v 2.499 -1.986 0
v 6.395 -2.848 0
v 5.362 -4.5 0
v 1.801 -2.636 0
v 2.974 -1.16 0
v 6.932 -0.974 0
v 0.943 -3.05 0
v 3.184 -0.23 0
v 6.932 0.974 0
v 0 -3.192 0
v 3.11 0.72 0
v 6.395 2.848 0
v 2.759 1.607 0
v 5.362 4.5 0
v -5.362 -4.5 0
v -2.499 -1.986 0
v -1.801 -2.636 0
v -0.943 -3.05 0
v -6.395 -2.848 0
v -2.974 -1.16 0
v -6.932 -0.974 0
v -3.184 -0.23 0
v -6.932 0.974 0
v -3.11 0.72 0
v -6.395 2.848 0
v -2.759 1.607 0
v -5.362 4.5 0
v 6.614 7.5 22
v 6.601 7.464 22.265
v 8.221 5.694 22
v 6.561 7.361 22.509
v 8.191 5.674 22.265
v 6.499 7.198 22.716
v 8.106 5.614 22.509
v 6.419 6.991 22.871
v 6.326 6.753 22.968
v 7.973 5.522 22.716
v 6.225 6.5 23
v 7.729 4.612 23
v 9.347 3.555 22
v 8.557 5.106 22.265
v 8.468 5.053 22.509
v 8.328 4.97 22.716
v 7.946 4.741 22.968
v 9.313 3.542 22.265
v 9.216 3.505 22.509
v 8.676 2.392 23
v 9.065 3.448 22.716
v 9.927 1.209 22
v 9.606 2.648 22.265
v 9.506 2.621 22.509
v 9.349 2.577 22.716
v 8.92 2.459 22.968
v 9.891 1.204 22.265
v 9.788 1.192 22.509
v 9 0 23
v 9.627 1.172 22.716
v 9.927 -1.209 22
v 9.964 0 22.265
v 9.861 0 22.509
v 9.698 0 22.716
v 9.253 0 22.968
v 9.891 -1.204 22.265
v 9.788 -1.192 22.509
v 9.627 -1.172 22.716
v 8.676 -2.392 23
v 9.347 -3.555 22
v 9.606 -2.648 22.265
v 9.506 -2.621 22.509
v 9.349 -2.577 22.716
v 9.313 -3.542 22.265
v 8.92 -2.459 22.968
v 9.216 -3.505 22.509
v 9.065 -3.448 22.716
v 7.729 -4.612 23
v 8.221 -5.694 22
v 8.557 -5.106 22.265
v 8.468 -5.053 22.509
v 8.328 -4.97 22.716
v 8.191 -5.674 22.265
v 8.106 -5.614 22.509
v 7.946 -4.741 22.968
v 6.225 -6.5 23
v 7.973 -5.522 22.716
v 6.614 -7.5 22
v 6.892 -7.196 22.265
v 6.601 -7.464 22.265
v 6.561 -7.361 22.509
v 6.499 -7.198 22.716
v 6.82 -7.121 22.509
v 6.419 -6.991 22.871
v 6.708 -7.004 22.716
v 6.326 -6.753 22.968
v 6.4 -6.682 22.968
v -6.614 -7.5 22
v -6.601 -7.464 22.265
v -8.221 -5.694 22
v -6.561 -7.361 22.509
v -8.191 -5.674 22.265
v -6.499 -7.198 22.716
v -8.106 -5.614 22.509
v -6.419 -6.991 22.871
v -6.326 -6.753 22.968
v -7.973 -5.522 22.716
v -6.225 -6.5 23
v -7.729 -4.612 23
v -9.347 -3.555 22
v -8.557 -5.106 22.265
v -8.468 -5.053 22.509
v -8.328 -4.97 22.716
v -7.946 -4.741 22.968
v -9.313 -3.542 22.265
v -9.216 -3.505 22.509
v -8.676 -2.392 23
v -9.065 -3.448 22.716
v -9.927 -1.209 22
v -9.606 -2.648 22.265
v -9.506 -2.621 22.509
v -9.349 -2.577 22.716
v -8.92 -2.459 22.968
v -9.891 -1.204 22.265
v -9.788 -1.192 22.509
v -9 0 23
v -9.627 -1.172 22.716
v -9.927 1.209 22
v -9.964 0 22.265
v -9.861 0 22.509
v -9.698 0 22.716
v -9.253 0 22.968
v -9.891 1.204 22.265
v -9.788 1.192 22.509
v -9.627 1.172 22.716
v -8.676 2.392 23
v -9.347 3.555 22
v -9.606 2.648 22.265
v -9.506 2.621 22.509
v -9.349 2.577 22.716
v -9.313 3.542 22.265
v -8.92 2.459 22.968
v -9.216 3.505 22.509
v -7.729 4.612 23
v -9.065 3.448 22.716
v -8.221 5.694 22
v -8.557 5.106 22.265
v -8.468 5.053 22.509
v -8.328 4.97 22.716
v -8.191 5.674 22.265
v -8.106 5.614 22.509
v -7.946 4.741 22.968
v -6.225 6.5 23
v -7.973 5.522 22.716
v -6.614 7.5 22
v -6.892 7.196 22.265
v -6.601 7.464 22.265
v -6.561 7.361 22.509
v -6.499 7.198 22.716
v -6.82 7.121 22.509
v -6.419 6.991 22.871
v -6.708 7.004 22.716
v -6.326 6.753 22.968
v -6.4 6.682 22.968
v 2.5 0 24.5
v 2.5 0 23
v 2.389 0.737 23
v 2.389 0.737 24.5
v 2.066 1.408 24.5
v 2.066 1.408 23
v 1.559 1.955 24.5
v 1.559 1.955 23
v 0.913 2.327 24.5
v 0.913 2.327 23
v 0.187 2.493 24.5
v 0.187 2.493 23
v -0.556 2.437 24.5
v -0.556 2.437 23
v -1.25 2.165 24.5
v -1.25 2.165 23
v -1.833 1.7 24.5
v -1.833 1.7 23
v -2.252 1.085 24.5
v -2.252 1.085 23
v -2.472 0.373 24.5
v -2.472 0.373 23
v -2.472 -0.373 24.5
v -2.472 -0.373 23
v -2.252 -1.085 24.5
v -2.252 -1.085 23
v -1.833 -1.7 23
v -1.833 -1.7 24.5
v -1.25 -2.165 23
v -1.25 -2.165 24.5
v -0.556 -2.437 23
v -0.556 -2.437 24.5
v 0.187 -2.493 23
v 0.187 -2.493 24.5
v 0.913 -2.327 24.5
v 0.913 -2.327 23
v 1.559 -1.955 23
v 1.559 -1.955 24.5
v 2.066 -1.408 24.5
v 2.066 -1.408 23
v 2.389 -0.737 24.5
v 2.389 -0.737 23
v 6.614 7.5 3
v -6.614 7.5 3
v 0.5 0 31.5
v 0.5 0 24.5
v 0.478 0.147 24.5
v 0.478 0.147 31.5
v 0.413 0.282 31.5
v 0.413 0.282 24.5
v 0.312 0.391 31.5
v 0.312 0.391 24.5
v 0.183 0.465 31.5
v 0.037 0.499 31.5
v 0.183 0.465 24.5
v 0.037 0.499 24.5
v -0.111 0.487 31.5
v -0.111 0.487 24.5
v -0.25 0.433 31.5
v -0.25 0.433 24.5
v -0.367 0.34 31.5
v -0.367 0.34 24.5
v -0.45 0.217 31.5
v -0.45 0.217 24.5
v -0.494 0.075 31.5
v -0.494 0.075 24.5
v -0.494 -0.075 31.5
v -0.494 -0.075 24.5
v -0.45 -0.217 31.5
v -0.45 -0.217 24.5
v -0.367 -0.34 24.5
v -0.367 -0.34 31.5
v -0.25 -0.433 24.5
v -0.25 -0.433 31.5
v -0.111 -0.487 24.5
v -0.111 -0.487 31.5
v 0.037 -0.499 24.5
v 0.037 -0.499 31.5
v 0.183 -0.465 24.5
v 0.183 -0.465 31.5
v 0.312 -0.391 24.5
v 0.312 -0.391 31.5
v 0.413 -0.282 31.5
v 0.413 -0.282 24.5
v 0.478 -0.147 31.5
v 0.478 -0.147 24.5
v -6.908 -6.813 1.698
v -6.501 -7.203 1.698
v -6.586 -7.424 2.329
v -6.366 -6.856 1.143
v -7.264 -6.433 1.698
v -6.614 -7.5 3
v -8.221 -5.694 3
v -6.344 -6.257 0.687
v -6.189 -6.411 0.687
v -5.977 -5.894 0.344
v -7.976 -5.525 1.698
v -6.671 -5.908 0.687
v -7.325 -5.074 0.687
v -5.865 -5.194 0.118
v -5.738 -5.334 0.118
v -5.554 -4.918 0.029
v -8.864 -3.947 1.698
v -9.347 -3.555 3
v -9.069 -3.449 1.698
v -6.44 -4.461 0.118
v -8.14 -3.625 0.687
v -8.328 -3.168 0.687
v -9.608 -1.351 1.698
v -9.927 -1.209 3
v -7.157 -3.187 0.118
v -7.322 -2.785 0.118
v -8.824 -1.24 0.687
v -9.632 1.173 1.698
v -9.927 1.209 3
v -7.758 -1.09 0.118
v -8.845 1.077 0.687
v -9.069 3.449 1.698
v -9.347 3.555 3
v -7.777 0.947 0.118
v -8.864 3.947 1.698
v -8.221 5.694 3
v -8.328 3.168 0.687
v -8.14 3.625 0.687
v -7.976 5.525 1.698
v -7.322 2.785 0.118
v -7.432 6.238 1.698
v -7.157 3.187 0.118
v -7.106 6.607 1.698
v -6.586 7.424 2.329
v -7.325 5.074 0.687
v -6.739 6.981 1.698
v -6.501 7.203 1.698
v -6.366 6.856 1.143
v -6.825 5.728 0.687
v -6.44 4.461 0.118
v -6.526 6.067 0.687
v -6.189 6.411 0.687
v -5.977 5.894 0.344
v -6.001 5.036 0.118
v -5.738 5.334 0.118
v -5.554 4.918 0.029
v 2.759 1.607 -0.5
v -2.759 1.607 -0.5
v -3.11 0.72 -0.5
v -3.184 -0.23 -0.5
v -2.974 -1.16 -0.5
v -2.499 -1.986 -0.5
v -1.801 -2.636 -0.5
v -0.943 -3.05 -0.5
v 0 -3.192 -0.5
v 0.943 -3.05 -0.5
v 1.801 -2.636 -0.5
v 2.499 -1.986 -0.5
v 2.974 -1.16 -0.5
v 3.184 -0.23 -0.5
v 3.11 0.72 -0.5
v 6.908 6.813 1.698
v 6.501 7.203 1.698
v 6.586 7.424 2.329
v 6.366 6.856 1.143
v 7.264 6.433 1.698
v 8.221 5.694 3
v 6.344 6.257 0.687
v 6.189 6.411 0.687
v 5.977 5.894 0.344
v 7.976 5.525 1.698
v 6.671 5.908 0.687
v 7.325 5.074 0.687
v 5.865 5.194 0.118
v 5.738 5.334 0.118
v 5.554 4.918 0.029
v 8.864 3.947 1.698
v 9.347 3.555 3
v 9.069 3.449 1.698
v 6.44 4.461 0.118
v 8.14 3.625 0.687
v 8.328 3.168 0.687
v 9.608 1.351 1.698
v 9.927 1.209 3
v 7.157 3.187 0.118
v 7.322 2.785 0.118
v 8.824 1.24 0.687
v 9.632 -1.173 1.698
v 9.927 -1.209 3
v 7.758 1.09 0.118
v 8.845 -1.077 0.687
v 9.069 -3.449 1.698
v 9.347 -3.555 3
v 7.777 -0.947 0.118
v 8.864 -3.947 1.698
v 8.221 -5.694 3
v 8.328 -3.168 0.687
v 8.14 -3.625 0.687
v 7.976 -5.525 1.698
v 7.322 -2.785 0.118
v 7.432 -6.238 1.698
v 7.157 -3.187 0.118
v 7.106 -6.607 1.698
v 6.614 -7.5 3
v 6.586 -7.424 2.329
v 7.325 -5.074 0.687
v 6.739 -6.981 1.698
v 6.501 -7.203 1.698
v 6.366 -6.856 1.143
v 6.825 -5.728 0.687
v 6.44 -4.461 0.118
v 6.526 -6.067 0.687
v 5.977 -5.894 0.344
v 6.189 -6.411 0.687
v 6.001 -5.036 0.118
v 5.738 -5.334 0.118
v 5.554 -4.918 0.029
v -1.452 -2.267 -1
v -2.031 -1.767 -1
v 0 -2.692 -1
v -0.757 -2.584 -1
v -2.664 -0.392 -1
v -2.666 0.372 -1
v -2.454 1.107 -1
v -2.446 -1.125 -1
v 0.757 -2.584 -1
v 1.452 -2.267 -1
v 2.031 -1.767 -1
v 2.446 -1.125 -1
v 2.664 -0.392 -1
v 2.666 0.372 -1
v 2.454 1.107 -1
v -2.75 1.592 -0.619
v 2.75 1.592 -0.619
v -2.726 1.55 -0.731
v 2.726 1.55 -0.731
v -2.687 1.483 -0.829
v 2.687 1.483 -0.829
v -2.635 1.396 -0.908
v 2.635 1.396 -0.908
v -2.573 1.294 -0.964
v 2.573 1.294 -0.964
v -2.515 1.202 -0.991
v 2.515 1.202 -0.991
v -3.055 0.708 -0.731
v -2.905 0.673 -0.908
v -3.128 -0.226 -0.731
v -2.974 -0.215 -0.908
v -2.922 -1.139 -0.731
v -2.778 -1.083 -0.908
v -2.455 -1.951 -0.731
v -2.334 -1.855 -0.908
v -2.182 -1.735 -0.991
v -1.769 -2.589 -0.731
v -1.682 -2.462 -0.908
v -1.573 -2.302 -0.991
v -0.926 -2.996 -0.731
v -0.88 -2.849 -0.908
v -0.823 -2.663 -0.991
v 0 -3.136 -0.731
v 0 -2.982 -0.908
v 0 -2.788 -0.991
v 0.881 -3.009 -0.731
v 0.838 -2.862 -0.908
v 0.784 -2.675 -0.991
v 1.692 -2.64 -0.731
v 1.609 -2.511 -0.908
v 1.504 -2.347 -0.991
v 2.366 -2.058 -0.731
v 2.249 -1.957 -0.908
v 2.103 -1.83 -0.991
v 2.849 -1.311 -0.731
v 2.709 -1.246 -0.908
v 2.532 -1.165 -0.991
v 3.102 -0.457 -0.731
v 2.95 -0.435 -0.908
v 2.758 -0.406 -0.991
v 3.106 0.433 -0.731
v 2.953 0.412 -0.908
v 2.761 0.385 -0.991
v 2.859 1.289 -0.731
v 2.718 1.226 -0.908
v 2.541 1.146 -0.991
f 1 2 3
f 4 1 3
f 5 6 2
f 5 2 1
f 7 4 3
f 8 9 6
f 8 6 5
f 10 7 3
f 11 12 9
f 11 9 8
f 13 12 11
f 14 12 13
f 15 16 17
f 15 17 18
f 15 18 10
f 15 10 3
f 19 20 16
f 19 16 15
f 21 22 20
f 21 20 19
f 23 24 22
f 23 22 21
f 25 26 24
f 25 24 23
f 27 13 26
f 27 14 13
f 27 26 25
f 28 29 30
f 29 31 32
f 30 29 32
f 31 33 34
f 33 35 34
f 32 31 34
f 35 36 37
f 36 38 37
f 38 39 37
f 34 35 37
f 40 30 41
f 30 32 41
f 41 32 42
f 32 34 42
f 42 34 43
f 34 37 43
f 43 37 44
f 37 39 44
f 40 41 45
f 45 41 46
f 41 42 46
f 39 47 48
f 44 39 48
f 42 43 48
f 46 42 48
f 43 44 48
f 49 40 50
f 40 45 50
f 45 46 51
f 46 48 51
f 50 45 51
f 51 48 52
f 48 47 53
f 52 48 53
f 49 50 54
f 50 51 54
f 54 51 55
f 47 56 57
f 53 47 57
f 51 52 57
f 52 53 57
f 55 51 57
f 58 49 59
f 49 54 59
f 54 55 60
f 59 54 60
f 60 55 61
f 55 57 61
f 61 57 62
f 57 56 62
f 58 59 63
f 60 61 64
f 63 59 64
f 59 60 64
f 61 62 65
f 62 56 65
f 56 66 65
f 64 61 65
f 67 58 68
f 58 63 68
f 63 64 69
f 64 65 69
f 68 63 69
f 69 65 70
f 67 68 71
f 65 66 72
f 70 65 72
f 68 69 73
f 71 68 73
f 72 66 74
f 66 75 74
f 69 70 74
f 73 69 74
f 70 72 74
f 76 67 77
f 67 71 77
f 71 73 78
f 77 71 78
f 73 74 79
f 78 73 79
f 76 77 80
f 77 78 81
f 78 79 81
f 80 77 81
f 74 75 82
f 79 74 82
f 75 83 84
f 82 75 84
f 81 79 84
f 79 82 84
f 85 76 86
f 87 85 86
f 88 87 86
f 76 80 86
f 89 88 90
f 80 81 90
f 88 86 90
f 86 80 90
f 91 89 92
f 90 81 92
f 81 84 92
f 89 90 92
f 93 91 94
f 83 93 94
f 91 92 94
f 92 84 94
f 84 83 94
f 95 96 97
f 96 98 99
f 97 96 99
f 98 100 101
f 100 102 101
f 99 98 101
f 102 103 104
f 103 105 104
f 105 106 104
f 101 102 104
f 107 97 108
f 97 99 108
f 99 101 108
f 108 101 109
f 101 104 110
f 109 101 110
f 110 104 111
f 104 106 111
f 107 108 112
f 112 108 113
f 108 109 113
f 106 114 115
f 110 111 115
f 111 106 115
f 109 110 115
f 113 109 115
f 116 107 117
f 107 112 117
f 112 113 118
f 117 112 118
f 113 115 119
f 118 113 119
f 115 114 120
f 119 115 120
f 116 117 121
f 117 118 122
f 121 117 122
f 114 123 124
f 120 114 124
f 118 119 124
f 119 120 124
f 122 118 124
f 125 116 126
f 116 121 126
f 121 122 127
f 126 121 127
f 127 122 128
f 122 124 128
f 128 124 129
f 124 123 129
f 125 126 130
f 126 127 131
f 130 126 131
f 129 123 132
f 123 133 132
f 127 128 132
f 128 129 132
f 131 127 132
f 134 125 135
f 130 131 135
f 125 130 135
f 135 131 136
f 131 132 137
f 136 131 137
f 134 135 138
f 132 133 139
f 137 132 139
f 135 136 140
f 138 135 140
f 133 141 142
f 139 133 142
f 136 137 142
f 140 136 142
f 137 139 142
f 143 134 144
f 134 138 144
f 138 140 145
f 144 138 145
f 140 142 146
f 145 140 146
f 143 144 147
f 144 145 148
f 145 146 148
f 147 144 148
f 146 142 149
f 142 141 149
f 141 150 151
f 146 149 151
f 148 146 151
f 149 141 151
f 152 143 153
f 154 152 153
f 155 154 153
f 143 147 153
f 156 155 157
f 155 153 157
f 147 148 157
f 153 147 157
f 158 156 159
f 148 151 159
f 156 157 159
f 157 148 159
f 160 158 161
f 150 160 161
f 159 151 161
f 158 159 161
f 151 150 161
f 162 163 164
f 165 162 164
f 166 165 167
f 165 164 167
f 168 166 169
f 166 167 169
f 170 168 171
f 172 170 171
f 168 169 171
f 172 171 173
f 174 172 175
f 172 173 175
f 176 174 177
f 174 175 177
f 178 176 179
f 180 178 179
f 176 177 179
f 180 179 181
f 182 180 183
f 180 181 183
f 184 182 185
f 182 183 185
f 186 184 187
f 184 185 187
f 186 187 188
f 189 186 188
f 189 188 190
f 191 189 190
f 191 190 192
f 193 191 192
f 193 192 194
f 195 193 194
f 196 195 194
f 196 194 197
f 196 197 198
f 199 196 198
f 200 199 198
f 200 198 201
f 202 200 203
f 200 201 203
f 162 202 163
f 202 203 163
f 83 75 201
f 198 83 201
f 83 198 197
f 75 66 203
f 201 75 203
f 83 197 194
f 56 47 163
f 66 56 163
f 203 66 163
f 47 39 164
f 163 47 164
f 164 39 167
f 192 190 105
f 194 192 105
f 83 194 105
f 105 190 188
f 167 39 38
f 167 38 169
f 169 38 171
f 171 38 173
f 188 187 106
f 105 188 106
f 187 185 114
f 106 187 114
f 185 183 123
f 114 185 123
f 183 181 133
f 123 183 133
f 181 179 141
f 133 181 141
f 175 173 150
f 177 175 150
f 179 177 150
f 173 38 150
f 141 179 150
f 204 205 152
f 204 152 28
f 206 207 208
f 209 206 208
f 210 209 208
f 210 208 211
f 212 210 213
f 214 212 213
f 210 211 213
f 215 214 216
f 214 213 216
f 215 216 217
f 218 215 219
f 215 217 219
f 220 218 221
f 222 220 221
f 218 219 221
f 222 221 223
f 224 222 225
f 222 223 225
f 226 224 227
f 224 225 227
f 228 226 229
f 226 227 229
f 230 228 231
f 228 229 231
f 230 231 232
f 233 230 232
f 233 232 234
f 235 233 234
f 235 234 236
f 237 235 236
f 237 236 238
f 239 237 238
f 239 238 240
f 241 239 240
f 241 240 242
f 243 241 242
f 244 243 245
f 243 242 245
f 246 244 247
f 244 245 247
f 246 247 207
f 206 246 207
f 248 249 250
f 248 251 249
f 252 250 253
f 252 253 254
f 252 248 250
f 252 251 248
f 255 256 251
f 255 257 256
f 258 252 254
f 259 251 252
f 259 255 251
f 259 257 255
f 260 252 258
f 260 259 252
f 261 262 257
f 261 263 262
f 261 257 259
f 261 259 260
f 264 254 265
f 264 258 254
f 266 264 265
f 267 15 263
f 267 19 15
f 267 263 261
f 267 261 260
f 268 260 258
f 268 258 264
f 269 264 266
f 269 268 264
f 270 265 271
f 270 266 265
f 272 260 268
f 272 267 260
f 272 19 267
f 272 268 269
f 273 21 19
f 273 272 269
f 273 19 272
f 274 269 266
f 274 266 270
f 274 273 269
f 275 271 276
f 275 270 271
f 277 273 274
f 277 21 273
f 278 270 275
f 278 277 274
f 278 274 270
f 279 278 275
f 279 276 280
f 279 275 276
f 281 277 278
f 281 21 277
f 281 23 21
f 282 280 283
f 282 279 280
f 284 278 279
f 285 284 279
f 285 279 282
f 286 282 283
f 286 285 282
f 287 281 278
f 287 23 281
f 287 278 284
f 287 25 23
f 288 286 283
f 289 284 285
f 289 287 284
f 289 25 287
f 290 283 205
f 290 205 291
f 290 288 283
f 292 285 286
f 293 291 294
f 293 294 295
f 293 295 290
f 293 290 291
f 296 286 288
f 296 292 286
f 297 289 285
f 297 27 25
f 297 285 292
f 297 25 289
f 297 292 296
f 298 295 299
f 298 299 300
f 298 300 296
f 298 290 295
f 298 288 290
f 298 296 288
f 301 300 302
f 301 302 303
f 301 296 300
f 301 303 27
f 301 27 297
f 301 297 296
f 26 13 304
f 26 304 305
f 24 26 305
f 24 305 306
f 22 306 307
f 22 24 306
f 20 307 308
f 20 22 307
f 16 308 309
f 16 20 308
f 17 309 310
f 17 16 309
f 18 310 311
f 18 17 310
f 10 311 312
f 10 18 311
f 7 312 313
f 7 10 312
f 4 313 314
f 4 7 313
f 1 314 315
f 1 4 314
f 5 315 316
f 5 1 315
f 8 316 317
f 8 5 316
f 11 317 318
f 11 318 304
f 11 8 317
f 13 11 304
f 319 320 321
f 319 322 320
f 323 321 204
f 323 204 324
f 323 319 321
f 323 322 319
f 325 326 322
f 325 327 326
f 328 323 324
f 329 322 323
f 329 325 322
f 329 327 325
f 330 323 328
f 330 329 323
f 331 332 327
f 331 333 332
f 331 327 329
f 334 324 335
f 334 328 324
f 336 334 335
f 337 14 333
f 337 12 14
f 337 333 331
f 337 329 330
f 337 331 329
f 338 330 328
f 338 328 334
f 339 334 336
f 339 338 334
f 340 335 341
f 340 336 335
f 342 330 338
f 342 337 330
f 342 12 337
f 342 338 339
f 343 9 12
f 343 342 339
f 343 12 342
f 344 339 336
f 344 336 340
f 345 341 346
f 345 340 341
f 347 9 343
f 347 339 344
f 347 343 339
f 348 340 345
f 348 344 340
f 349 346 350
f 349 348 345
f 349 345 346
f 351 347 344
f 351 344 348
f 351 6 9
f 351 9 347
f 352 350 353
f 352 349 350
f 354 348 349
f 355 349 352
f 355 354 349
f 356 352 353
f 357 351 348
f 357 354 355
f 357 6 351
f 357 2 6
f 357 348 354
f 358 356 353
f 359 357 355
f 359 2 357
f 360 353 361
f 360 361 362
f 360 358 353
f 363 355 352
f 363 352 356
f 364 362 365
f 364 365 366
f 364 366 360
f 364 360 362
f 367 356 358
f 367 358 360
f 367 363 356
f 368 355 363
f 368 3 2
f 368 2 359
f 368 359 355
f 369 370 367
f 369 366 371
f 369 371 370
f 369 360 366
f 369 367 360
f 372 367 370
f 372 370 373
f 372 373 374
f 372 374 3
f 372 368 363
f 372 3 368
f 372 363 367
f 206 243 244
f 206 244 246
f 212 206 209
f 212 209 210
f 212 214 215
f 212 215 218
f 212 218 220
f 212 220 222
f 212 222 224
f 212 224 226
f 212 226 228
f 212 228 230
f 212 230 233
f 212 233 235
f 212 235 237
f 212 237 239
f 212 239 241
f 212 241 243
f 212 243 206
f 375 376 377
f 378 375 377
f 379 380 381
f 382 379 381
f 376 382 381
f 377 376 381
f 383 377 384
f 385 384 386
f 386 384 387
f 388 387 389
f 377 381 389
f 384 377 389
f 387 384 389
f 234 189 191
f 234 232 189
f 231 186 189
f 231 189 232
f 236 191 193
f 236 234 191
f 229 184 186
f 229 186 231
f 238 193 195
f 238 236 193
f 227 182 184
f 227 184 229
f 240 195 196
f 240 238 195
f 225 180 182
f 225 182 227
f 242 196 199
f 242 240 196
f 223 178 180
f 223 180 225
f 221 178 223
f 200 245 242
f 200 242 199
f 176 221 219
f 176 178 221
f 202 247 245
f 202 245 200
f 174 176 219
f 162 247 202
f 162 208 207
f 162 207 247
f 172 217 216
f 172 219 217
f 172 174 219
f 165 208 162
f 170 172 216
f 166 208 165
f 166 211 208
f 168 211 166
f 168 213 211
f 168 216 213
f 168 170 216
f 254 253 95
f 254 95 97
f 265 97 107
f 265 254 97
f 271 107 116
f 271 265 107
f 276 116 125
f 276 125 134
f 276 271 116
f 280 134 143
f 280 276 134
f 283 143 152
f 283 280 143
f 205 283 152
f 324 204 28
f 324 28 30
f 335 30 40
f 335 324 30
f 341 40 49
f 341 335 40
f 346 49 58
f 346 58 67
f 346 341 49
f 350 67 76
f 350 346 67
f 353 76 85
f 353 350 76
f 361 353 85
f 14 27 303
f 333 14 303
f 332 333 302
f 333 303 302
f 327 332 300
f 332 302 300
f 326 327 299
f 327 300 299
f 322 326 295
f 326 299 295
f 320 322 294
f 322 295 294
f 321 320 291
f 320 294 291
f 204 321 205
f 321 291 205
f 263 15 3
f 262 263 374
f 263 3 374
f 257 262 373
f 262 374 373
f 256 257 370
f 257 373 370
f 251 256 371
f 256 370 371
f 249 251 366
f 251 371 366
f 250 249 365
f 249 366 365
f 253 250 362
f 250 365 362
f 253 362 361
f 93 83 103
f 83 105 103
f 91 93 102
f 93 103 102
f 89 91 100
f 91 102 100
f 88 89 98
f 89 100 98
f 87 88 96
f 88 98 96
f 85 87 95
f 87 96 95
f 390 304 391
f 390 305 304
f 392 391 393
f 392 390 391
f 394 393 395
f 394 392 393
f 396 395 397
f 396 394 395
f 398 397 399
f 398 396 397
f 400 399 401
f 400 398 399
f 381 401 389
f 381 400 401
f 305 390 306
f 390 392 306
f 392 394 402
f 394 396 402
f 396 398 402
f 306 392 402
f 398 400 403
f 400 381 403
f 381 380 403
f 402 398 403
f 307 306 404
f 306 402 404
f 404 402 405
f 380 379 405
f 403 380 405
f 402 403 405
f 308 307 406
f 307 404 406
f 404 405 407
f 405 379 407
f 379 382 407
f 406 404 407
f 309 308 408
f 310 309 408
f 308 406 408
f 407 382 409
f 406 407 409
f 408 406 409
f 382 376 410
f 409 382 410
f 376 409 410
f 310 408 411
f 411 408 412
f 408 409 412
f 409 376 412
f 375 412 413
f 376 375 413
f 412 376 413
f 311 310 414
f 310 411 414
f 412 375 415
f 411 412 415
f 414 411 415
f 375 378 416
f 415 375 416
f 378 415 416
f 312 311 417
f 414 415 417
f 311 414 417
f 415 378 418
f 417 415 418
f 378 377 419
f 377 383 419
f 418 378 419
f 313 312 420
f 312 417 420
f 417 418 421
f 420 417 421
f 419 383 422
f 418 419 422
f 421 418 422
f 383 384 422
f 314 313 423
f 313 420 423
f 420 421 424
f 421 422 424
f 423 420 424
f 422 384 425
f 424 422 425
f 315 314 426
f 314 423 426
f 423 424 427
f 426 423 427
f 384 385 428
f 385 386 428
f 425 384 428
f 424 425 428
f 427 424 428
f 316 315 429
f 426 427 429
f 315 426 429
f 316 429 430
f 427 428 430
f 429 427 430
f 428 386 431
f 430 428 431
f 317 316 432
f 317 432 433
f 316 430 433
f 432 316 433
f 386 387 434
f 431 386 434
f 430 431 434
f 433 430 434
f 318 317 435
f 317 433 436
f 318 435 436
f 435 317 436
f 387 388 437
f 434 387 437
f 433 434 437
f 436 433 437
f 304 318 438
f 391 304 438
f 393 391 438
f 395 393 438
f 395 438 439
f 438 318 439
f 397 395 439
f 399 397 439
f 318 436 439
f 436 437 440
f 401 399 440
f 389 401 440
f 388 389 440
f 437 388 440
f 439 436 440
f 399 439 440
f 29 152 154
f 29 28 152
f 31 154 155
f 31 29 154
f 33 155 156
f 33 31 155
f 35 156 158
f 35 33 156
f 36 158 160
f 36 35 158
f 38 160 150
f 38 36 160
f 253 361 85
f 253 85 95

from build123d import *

# Parameters (mm, degrees)
BOSS_EXTRUDE1_DEPTH = 23
SKETCH2_R           = 2.5
BOSS_EXTRUDE2_DEPTH = 1.5
SKETCH3_R           = 0.5
BOSS_EXTRUDE3_DEPTH = 7
FILLET1_R           = 1
FILLET2_R           = 3
BOSS_EXTRUDE4_DEPTH = 1
FILLET3_R           = 0.5


with BuildPart() as part:
    # Sketch1 → Boss-Extrude1 (new body)
    with BuildSketch(Plane.XY):
        with BuildLine():
            Line((-6.614378278, 7.5), (6.614378278, 7.5))
            ThreePointArc((6.614378278, 7.5), (10, 0), (6.614378278, -7.5))
            Line((6.614378278, -7.5), (-6.614378278, -7.5))
            ThreePointArc((-6.614378278, -7.5), (-10, 0), (-6.614378278, 7.5))
        make_face()
    extrude(amount=BOSS_EXTRUDE1_DEPTH)

    # Sketch2 → Boss-Extrude2 (add)
    with BuildSketch(Plane.XY.offset(23)):
        Circle(SKETCH2_R)
    extrude(amount=BOSS_EXTRUDE2_DEPTH)

    # Sketch3 → Boss-Extrude3 (add)
    with BuildSketch(Plane.XY.offset(24.5)):
        Circle(SKETCH3_R)
    extrude(amount=BOSS_EXTRUDE3_DEPTH)

    # Fillet1
    fillet1_edges = [part.edges().sort_by_distance(p)[0] for p in [
        (10, 0, 23),
        (0, 7.5, 23),
        (-10, 0, 23),
        (0, -7.5, 23),
    ]]
    fillet(fillet1_edges, radius=FILLET1_R)

    # Fillet2
    # the kernel refuses this fillet: 3 mm, written as the material it takes off along each edge
    with BuildSketch(Plane(origin=(-14.114378278, 7.5, 0), x_dir=(0, 0, 1), z_dir=(1, 0, 0))) as fillet2_piece_1:
        with BuildLine():
            CenterArc((FILLET2_R, FILLET2_R), FILLET2_R, 180, 90)
            Line((0, FILLET2_R), (0, 0))
            Line((0, 0), (FILLET2_R, 0))
        make_face()
    extrude(amount=28.228756555, mode=Mode.SUBTRACT)
    with BuildSketch(Plane(origin=(0, 0, 0), x_dir=(-0.027613533277189895, 0.9996186736850955, 0), z_dir=(-0.9996186736850955, -0.027613533277189895, 0))) as fillet2_piece_2:
        with BuildLine():
            CenterArc((10 - FILLET2_R, -FILLET2_R), FILLET2_R, 0, 90)
            Line((10, -FILLET2_R), (10, 0))
            Line((10, 0), (10 - FILLET2_R, 0))
        make_face()
    revolve(axis=Axis((0, 0, 0), (0, 0, -1)), revolution_arc=183.164680097, mode=Mode.SUBTRACT)
    with BuildSketch(Plane(origin=(14.114378278, -7.5, 0), x_dir=(0, 1, 0), z_dir=(-1, 0, 0))) as fillet2_piece_3:
        with BuildLine():
            CenterArc((FILLET2_R, -FILLET2_R), FILLET2_R, 90, 90)
            Line((0, -FILLET2_R), (0, 0))
            Line((0, 0), (FILLET2_R, 0))
        make_face()
    extrude(amount=28.228756555, mode=Mode.SUBTRACT)
    with BuildSketch(Plane(origin=(0, 0, 0), x_dir=(0.02761353327718998, -0.9996186736850955, 0), z_dir=(0.9996186736850955, 0.02761353327718998, 0))) as fillet2_piece_4:
        with BuildLine():
            CenterArc((10 - FILLET2_R, -FILLET2_R), FILLET2_R, 0, 90)
            Line((10 - FILLET2_R, 0), (10, 0))
            Line((10, 0), (10, -FILLET2_R))
        make_face()
    revolve(axis=Axis((0, 0, 0), (0, 0, -1)), revolution_arc=183.164680097, mode=Mode.SUBTRACT)

    # Sketch4 → Boss-Extrude4 (add)
    with BuildSketch(Plane(origin=(0, 0, 0), x_dir=(-1, 0, 0), z_dir=(0, 0, -1))):
        with BuildLine():
            Line((-2.758585466, 1.606625472), (2.758585466, 1.606625472))
            ThreePointArc((2.758585466, 1.606625472), (0, -3.192340705), (-2.758585466, 1.606625472))
        make_face()
    extrude(amount=BOSS_EXTRUDE4_DEPTH)

    # Fillet3
    fillet3_edges = [part.edges().sort_by_distance(p)[0] for p in [
        (0, -3.192340705, -1),
        (0, 1.606625472, -1),
    ]]
    fillet(fillet3_edges, radius=FILLET3_R)


solid = part.part
